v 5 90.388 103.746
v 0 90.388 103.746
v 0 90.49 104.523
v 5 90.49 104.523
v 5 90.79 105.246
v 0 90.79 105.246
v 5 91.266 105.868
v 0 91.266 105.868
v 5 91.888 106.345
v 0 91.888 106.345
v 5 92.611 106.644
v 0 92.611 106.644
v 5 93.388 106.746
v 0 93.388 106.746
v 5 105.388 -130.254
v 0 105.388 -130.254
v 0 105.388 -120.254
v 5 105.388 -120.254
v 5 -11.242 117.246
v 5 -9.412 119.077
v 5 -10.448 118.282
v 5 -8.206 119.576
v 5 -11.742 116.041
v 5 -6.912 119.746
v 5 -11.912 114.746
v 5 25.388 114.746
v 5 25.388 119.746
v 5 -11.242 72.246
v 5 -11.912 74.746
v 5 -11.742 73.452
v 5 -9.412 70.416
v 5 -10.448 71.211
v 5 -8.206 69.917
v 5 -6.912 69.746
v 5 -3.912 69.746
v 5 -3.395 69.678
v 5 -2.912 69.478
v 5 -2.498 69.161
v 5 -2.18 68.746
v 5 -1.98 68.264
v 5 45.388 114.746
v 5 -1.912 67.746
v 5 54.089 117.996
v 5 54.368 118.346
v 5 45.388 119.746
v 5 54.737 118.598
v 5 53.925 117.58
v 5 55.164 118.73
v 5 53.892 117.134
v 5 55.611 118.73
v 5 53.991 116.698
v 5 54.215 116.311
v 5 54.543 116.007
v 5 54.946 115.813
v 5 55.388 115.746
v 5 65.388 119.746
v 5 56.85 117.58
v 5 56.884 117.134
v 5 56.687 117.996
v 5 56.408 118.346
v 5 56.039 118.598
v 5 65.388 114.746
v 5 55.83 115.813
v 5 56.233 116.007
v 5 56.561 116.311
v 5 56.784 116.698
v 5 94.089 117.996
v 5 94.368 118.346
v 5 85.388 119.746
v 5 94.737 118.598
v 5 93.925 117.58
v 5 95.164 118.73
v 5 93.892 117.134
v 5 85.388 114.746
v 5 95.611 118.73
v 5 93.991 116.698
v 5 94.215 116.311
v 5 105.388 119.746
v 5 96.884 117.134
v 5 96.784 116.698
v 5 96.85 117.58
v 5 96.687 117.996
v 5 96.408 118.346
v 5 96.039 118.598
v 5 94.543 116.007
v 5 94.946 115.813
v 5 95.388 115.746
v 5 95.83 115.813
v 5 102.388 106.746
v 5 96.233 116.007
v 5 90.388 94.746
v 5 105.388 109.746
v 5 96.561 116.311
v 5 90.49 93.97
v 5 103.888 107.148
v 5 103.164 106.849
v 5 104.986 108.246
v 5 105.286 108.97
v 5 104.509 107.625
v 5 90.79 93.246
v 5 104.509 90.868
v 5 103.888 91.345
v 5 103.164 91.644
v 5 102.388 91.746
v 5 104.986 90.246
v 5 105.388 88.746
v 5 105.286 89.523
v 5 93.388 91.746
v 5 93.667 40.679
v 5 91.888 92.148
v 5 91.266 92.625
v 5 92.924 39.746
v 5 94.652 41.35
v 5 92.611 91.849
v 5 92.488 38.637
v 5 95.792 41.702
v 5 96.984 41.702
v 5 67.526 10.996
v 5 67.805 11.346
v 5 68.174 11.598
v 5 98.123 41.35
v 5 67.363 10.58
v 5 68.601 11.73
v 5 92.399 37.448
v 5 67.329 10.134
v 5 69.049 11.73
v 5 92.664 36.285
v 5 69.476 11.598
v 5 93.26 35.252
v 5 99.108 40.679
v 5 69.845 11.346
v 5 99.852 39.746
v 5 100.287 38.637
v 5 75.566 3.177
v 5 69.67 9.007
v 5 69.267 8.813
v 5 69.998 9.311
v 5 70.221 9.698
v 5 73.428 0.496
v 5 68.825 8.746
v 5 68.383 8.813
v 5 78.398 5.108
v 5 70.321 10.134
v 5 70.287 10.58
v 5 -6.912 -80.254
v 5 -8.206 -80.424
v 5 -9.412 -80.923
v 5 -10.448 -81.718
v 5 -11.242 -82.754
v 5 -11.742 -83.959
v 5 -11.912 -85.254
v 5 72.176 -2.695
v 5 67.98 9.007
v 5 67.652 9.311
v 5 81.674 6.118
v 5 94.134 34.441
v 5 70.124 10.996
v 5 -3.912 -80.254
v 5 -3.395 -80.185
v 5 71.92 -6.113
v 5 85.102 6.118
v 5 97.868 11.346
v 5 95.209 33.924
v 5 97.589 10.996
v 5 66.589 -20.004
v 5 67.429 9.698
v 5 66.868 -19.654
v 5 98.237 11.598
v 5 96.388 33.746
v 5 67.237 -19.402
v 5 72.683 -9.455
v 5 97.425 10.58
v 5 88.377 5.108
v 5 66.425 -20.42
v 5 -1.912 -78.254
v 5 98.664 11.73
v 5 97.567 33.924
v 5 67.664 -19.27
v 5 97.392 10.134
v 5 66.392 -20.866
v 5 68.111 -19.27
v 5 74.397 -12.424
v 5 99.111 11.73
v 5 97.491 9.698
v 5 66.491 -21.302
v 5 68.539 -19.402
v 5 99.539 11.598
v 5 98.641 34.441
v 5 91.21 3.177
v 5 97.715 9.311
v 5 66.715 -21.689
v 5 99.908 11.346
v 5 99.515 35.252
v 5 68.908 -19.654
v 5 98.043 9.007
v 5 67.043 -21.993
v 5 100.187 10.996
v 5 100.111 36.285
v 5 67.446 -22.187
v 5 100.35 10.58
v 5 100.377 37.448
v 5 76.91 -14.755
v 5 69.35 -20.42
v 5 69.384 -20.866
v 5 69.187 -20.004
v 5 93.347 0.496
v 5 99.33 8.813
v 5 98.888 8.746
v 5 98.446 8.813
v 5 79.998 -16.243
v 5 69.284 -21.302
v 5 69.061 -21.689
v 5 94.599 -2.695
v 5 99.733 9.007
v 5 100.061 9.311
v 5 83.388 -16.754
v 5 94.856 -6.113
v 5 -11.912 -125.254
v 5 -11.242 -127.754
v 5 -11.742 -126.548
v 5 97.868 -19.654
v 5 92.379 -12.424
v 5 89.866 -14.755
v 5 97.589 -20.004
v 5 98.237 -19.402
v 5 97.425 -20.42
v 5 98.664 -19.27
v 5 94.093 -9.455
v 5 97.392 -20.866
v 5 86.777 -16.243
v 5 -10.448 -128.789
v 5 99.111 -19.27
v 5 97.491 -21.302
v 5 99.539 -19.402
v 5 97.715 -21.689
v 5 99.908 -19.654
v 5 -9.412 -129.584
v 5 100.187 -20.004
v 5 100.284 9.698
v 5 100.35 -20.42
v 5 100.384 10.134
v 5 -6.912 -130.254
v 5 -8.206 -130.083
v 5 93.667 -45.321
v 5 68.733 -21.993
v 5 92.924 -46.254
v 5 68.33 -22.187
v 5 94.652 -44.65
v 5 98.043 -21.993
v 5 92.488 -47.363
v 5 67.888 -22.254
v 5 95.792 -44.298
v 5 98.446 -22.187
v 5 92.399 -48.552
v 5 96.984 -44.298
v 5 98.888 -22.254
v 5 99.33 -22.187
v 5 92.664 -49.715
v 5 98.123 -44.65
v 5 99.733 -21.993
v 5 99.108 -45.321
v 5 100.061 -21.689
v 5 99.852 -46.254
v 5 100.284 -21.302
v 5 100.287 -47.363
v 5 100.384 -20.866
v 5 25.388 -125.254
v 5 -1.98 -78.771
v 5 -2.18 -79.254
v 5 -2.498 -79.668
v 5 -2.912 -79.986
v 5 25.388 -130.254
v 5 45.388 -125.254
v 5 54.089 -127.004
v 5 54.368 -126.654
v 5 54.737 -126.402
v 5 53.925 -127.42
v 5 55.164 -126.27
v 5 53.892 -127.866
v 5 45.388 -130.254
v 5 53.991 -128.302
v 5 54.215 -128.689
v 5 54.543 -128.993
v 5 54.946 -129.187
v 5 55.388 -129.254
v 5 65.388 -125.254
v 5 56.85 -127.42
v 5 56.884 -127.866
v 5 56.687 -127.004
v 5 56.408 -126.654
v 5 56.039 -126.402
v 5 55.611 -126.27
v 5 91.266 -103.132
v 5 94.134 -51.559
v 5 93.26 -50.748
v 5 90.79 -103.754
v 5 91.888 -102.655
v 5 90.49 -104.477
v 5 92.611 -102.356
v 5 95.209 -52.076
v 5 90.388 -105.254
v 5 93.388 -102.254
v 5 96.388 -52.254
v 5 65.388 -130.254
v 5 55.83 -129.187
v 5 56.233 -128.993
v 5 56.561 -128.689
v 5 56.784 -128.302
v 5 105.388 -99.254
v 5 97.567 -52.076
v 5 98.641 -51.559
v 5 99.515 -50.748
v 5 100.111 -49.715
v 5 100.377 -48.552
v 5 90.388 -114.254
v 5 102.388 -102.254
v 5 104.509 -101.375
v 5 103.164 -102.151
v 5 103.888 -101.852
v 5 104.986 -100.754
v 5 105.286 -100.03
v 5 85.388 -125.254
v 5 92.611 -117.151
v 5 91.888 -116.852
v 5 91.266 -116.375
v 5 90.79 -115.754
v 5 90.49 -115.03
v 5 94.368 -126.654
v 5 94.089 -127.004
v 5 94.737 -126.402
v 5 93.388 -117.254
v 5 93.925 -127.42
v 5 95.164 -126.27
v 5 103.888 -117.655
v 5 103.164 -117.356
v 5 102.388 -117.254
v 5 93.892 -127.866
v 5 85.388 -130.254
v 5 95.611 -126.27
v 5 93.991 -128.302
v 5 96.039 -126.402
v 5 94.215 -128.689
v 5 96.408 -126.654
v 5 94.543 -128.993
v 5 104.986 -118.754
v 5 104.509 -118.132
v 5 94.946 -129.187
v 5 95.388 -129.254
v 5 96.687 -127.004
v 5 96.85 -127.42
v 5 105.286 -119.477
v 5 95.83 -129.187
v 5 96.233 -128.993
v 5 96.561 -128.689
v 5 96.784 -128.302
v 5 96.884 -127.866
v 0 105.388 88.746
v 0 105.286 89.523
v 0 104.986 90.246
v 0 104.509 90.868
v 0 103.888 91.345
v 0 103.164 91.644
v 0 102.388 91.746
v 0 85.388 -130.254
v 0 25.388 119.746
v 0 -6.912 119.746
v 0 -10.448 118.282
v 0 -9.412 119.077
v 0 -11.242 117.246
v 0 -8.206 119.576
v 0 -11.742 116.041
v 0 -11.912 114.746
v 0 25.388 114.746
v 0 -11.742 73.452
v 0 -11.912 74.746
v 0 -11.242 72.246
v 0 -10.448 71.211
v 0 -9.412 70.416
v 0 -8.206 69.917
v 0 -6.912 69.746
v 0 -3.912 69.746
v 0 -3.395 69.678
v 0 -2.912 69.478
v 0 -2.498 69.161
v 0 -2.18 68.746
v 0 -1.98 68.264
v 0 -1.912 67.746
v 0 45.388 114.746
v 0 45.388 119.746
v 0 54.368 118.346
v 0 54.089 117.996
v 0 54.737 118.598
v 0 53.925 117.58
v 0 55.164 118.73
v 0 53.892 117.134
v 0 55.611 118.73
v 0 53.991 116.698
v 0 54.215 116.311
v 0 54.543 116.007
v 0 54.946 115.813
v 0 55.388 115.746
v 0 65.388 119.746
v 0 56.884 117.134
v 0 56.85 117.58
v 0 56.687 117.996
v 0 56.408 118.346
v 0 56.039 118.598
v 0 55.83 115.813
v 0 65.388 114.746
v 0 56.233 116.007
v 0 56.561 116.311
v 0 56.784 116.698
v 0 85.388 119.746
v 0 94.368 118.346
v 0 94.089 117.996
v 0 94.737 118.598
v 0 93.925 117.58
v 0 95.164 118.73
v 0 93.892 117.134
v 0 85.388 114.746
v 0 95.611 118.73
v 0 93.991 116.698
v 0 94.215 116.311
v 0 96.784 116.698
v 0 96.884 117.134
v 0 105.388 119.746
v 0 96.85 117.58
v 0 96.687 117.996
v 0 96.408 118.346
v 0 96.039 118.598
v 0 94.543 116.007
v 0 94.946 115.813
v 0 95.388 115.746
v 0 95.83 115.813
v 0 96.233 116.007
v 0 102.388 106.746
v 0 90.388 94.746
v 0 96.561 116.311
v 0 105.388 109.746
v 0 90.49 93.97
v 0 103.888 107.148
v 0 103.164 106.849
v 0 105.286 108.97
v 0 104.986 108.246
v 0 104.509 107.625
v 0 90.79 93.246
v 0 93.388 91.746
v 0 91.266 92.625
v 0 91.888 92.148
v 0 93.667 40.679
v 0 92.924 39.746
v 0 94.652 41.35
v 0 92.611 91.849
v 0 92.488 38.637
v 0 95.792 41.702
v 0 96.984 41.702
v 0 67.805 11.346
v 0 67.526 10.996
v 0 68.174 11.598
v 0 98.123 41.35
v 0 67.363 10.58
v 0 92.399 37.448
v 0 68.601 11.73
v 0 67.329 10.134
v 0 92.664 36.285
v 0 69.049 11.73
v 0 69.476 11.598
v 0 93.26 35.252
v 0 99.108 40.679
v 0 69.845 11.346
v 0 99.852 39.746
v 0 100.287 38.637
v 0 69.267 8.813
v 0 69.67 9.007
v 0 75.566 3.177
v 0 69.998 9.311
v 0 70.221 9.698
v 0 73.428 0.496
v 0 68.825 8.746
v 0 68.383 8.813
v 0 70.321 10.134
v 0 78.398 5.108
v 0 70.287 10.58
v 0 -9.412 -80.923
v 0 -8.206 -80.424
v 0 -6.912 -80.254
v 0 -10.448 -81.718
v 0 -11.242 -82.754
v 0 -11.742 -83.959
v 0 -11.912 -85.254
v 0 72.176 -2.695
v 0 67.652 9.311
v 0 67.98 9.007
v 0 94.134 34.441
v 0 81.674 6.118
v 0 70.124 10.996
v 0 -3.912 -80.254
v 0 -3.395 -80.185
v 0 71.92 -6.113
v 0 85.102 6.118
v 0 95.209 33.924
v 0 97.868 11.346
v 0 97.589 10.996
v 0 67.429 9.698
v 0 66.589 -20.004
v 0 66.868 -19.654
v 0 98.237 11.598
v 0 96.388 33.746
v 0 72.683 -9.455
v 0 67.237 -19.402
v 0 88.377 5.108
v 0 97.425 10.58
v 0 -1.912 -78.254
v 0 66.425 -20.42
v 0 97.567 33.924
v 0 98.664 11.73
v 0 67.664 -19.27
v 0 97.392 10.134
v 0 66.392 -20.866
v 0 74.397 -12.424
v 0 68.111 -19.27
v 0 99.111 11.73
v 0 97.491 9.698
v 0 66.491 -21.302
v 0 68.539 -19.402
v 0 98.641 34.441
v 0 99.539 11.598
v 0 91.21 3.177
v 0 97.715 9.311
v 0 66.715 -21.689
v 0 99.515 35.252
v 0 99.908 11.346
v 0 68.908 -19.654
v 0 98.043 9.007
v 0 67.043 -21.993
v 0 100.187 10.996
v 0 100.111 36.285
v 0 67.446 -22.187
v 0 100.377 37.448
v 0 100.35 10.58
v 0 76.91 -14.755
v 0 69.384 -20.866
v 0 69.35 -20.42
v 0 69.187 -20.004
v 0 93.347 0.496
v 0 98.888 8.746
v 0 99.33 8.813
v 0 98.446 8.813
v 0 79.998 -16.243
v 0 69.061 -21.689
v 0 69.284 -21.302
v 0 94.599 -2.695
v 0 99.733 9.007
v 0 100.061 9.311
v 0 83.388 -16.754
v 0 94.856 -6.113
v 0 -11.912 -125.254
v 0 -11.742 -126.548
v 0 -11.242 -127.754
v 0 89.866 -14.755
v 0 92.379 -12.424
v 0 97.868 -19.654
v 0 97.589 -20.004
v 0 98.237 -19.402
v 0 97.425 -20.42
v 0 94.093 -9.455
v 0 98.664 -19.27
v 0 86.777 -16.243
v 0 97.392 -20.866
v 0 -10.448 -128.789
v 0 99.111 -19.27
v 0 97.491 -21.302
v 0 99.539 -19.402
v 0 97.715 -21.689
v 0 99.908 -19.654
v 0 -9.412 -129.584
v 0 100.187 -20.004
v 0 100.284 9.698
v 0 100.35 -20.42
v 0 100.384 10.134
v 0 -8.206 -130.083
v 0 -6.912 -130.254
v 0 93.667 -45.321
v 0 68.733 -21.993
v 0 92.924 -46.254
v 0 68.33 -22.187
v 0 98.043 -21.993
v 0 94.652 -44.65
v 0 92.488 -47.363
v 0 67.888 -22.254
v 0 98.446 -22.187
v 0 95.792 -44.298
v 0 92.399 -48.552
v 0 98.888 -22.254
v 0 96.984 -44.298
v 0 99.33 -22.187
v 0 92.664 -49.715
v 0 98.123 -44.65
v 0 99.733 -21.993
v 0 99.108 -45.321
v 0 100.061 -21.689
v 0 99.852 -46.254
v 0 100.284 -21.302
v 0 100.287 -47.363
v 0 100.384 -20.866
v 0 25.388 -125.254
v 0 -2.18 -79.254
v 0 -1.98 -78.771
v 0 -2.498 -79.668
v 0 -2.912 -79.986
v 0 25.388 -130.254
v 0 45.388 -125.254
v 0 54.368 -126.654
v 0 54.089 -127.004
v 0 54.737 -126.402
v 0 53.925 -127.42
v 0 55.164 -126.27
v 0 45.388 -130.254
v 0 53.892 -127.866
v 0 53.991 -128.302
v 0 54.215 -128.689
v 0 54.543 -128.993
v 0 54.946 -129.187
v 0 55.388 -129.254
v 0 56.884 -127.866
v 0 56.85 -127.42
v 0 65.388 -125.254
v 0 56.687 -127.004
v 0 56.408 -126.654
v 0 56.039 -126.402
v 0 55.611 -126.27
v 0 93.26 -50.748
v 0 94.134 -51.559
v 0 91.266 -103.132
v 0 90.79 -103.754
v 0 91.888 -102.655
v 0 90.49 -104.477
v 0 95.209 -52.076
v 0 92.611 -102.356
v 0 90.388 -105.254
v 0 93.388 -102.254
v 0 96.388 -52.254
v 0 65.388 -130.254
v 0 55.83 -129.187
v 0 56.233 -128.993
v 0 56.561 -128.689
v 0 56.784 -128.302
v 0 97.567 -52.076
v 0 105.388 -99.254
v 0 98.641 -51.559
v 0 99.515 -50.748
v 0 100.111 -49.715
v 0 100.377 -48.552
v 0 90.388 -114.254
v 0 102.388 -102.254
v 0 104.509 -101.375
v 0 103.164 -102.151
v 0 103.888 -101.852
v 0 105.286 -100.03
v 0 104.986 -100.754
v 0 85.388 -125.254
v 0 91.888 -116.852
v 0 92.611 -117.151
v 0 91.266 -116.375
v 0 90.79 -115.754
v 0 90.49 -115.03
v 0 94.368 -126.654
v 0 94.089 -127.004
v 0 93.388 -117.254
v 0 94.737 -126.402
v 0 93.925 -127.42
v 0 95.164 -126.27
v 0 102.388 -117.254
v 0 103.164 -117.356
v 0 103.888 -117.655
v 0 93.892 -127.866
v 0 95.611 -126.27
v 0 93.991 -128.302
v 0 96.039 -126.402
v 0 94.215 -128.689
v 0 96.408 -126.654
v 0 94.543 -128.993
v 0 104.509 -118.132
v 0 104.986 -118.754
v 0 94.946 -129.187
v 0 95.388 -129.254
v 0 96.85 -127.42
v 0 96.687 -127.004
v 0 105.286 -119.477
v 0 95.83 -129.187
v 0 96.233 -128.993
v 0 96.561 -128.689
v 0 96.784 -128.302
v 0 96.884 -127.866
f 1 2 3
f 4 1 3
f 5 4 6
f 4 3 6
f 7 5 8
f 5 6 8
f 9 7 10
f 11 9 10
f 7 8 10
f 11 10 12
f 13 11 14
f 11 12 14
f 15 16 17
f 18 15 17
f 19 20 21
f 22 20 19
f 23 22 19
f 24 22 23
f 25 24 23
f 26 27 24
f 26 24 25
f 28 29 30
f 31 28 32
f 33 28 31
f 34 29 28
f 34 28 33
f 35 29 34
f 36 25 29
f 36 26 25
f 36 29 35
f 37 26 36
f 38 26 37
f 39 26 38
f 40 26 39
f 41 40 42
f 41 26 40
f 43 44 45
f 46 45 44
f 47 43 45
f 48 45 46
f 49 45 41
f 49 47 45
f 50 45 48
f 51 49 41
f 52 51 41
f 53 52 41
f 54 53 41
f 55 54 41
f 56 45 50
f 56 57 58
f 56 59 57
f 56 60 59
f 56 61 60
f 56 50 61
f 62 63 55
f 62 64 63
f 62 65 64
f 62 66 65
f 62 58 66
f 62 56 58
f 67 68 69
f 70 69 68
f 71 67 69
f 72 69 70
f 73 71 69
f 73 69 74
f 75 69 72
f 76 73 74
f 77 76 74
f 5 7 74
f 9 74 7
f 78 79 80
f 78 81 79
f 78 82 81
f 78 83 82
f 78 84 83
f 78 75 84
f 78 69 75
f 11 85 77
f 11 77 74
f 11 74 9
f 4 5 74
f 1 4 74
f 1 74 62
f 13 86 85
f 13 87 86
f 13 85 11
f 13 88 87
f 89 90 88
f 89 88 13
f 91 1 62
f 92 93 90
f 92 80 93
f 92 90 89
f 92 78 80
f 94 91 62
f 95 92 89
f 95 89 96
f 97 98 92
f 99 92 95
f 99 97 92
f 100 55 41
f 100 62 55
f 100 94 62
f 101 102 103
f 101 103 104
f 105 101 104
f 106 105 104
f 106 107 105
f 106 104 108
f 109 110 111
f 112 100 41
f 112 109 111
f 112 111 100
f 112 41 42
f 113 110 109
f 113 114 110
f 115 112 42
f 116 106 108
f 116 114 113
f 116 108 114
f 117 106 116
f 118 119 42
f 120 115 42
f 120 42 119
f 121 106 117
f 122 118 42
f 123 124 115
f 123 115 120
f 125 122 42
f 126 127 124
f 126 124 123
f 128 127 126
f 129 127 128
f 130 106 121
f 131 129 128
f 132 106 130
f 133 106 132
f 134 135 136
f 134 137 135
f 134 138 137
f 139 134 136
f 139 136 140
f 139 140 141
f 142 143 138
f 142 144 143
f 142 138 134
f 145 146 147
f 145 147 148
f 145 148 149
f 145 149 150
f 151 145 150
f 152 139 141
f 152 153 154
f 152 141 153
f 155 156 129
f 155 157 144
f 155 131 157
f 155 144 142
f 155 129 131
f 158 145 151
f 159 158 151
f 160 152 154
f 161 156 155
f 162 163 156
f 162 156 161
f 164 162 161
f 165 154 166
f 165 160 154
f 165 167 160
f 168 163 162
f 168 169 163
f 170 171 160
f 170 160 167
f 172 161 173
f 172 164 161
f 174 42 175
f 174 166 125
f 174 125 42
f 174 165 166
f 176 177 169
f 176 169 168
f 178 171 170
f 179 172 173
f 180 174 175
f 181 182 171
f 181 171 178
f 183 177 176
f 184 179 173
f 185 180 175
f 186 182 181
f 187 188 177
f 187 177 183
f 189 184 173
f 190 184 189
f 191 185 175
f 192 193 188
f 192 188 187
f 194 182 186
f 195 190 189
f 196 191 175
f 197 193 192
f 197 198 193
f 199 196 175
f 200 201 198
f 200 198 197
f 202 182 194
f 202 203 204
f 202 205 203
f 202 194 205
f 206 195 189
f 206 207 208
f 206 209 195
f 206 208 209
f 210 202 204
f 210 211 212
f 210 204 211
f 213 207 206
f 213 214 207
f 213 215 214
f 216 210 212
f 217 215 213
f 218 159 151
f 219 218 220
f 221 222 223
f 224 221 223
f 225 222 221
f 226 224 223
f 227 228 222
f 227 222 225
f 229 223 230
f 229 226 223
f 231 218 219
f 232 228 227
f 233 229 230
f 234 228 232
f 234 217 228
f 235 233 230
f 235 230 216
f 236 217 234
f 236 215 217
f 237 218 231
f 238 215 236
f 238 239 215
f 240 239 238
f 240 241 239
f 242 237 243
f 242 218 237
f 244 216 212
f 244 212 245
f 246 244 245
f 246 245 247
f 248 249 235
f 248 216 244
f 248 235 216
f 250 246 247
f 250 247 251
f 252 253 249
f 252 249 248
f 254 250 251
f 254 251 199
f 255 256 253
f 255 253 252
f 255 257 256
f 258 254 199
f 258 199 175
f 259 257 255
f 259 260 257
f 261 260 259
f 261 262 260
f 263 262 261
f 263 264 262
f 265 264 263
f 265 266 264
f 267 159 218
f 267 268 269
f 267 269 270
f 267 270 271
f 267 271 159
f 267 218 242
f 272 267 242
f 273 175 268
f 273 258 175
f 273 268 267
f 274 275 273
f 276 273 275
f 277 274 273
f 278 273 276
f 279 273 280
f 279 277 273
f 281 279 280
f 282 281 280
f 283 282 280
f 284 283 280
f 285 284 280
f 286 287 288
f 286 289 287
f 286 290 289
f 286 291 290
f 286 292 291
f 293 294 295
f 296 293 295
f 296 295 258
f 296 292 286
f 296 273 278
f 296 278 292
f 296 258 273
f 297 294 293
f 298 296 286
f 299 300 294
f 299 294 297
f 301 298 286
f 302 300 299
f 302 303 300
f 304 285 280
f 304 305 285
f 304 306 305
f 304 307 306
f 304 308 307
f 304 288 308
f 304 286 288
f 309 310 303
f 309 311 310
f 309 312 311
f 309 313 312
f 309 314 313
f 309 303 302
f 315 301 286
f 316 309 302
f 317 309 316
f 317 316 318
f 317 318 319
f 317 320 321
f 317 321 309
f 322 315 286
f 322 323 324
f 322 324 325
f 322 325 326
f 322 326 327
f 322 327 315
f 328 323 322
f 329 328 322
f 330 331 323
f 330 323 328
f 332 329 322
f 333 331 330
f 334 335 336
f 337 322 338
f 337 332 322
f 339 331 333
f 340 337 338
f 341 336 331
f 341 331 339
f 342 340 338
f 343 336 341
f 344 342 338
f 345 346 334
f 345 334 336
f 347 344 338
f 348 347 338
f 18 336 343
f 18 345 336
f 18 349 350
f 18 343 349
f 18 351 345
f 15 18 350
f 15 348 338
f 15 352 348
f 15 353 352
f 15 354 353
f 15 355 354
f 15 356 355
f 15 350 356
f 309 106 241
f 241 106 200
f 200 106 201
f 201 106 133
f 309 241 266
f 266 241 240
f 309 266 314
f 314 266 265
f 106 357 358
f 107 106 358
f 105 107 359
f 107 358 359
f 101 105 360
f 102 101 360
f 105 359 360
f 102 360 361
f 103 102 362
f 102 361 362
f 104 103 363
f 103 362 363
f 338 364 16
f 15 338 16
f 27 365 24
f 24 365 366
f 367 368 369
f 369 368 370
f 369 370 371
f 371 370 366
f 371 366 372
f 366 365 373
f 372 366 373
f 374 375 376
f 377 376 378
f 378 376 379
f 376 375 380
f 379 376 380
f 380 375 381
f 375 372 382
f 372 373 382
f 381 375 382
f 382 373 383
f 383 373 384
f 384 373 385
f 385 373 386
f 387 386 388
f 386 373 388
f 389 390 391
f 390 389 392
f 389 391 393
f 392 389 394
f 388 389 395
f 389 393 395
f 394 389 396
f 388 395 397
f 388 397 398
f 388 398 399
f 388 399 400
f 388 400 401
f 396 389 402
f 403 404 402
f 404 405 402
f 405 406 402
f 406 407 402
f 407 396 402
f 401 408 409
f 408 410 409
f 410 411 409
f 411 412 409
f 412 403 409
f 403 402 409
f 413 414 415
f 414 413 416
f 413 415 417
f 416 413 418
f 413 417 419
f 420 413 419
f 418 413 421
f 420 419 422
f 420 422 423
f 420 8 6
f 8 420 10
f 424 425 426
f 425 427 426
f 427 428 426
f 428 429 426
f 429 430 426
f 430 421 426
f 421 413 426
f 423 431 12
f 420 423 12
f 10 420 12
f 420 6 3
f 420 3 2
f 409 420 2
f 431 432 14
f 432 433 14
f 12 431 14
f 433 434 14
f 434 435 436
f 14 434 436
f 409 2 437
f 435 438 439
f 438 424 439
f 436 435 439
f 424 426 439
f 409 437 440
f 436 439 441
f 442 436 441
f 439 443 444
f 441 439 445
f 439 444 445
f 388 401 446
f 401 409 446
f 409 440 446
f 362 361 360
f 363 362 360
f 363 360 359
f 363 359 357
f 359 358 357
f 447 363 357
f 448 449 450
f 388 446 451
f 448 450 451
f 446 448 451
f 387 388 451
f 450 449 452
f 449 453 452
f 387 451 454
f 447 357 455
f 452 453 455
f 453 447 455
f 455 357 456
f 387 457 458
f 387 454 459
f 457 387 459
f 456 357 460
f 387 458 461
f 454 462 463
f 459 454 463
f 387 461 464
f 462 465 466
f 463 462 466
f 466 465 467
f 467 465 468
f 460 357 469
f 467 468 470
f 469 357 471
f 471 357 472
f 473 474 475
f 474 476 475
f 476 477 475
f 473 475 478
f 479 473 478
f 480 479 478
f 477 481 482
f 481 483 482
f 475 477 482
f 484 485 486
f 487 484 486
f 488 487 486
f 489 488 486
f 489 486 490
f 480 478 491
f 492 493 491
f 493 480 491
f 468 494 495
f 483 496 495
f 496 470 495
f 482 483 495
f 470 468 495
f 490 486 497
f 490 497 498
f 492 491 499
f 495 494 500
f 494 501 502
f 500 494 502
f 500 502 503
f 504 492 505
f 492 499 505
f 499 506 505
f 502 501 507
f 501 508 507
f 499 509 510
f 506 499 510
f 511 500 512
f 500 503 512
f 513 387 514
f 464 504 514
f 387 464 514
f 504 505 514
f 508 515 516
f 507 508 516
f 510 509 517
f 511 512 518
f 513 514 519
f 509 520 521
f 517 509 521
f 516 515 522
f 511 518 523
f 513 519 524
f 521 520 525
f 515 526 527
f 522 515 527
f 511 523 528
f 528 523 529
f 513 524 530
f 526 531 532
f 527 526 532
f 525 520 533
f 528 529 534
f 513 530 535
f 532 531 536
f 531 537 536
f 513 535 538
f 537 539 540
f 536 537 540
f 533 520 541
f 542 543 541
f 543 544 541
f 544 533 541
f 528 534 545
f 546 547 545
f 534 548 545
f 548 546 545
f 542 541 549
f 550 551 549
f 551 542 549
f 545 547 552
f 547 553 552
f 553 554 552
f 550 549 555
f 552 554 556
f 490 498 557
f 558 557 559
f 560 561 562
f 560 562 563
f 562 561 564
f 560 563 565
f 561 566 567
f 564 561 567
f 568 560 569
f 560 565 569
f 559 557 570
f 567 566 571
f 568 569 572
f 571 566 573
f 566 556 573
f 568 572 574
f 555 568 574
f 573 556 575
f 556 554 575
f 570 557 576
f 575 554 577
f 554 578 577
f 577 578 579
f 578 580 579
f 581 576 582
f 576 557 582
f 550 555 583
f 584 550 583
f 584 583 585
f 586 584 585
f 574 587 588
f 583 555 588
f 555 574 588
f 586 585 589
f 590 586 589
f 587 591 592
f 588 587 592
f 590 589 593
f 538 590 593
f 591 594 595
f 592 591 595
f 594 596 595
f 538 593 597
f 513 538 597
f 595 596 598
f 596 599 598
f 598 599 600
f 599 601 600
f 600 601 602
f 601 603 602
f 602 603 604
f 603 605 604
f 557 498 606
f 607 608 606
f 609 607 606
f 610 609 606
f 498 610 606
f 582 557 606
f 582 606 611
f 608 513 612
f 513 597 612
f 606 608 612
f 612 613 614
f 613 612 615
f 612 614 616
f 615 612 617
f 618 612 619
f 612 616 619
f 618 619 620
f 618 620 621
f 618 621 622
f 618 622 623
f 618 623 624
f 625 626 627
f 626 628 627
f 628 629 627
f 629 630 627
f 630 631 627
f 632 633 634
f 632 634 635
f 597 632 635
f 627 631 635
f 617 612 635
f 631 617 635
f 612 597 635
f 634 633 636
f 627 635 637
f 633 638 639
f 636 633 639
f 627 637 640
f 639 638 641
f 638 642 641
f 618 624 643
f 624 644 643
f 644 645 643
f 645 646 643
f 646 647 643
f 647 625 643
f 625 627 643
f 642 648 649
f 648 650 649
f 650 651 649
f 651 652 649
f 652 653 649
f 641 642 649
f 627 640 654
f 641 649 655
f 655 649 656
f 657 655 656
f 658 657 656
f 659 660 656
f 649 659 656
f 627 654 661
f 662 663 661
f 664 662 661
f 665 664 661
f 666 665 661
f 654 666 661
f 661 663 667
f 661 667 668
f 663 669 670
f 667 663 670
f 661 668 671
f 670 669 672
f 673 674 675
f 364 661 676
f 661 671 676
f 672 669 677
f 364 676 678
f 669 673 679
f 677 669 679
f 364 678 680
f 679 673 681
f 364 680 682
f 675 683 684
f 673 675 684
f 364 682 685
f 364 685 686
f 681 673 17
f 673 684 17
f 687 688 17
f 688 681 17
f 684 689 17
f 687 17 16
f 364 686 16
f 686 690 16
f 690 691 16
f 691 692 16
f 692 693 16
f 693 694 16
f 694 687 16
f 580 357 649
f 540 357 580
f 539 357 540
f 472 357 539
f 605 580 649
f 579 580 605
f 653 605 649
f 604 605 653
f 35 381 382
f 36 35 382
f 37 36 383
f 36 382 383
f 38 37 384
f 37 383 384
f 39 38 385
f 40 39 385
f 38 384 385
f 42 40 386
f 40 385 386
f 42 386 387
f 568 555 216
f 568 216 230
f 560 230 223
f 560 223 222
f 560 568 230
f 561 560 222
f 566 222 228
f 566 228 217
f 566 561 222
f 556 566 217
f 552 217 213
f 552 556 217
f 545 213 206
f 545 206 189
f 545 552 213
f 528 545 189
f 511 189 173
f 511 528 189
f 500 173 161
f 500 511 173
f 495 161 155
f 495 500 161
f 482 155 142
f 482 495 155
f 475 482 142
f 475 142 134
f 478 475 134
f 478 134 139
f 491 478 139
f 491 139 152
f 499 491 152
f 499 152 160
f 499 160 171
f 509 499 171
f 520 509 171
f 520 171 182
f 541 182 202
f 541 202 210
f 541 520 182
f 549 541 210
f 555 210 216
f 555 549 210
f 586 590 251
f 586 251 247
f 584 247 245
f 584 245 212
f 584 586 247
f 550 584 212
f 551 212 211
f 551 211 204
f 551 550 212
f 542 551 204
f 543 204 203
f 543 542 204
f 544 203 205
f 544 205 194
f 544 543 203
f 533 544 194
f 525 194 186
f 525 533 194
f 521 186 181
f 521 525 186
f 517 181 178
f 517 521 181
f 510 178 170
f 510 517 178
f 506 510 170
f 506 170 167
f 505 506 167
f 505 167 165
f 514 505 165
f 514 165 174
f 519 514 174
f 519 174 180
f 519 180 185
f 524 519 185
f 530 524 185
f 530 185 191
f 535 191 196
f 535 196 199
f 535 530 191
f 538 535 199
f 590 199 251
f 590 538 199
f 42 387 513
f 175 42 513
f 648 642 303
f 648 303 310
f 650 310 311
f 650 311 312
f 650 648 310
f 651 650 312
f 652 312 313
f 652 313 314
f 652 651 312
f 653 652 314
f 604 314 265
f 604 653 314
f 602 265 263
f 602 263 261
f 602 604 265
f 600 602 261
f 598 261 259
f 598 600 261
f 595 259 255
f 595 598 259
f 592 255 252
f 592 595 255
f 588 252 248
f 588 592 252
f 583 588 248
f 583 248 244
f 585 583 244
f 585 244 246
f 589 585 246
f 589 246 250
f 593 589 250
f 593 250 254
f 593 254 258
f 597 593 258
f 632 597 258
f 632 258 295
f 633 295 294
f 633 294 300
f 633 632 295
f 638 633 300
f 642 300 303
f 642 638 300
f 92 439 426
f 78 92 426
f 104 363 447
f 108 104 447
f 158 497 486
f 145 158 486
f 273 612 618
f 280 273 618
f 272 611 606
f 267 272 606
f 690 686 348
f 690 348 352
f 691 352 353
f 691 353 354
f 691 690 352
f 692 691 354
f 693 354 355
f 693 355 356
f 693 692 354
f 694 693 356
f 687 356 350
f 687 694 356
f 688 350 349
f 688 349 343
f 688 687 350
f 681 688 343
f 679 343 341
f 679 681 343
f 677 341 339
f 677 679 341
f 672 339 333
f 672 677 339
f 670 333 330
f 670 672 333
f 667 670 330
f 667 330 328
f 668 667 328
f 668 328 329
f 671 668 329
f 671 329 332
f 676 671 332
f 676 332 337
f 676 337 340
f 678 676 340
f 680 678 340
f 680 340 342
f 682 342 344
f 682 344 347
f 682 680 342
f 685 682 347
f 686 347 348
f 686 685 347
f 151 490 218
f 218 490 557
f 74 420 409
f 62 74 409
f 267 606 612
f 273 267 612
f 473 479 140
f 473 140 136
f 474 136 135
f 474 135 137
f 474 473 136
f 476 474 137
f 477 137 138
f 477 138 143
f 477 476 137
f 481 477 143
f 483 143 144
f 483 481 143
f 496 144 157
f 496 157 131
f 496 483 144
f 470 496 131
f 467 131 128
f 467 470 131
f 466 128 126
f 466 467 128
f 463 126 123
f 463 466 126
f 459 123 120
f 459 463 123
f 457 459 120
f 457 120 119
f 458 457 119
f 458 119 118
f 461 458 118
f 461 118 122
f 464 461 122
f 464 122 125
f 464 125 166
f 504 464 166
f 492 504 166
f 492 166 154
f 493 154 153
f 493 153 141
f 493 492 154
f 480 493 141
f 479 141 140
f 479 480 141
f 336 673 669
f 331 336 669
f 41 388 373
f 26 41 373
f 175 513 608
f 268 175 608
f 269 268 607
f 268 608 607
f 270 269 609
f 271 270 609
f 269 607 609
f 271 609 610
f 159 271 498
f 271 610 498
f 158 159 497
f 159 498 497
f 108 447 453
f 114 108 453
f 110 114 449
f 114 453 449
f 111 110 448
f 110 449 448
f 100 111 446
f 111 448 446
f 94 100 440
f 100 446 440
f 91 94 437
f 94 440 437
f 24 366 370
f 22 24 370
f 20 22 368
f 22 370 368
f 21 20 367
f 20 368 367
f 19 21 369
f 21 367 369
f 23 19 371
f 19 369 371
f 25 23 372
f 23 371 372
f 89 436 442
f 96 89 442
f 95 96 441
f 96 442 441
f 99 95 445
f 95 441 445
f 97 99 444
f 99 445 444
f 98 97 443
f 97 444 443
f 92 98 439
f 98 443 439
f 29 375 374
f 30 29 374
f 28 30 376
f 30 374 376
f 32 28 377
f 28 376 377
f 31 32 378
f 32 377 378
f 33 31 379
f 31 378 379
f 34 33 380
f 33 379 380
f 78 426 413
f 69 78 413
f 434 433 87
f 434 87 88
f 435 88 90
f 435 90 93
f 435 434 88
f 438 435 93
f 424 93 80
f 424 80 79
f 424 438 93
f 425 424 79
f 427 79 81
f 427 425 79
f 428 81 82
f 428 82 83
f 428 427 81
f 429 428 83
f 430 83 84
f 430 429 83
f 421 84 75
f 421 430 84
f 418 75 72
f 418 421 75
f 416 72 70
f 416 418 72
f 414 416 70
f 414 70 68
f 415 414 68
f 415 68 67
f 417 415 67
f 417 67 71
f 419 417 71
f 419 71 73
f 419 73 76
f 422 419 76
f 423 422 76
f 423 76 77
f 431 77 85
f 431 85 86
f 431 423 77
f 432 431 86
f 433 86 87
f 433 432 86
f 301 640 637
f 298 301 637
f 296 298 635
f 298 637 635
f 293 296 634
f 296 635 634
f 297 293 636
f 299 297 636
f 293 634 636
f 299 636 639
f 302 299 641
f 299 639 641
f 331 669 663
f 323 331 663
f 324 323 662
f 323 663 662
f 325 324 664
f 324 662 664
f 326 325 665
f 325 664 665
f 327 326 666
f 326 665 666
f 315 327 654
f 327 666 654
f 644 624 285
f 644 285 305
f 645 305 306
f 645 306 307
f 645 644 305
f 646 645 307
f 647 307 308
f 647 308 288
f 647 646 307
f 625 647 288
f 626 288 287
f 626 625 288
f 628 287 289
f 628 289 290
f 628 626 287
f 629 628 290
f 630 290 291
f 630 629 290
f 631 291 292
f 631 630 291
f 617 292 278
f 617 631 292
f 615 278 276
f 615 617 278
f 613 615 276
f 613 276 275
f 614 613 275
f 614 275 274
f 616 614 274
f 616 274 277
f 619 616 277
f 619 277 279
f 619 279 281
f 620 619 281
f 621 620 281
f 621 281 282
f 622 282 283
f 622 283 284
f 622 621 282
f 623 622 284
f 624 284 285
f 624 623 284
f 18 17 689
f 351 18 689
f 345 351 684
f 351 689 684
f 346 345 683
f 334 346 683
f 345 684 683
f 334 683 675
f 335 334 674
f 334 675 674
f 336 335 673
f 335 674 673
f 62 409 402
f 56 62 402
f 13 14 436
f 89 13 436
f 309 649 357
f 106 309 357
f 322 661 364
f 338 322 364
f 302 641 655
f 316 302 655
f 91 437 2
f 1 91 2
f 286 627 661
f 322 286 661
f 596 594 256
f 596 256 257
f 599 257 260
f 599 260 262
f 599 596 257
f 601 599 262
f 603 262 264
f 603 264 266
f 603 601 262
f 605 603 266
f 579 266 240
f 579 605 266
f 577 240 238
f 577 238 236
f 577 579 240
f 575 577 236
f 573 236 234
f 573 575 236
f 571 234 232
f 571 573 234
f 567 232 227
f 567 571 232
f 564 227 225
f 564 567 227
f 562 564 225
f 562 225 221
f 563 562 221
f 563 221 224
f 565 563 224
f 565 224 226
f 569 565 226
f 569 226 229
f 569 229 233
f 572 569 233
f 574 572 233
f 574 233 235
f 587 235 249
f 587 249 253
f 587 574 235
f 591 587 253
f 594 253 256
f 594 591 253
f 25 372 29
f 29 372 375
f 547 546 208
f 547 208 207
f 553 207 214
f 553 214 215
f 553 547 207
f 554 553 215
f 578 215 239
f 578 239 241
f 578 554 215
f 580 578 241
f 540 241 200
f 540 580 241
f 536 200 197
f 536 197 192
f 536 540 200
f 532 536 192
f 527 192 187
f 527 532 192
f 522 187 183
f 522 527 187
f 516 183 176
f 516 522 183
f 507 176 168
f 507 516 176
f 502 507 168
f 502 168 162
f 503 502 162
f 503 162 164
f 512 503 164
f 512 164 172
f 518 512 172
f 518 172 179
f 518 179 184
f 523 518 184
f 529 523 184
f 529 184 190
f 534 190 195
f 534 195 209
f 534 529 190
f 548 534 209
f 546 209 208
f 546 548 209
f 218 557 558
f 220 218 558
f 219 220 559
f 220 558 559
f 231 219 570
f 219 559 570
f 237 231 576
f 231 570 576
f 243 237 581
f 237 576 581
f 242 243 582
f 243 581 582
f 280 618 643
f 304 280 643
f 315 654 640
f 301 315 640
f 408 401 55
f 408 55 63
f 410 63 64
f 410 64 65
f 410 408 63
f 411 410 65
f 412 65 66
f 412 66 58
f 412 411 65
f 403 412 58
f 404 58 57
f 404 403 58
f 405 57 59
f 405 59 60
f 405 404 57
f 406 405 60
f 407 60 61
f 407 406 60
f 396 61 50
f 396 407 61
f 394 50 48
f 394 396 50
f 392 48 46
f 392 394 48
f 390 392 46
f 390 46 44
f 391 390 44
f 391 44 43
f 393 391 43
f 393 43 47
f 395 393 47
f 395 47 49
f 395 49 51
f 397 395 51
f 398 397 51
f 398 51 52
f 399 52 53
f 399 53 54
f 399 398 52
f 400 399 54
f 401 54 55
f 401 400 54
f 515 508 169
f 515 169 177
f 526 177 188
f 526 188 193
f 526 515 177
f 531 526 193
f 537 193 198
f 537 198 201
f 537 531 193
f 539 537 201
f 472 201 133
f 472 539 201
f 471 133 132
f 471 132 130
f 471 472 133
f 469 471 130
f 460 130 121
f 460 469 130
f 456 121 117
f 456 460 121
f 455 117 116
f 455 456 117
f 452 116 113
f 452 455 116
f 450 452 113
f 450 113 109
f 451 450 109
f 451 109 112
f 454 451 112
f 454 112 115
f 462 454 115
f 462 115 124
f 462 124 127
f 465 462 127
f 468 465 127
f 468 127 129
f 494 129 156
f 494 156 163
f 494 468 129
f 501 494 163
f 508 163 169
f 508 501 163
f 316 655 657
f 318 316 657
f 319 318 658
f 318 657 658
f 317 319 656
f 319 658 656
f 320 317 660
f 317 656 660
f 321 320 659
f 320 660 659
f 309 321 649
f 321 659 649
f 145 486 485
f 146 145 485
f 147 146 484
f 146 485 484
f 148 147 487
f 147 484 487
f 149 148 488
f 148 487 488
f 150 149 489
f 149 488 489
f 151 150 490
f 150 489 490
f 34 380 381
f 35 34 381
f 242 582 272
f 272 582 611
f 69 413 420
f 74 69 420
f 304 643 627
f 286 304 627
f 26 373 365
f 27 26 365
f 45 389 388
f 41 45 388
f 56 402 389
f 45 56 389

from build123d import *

# Parameters (mm, degrees)
SKETCH_1_R      = 4
SKETCH_1_R_2    = 11.5
SKETCH_1_R_3    = 1.5
EXTRUDE_1_DEPTH = 5


with BuildPart() as part:
    # 草图1 → 凸台-拉伸1 (new body)
    with BuildSketch(Plane(origin=(0, 0, 0), x_dir=(0, 0, -1), z_dir=(1, 0, 0))):
        with BuildLine():
            Line((-69.746431282, -6.912239682), (-69.746431282, -3.912239682))
            ThreePointArc((-69.746431282, -3.912239682), (-69.160644844, -2.49802612), (-67.746431282, -1.912239682))
            Line((-67.746431282, -1.912239682), (78.253568718, -1.912239682))
            ThreePointArc((78.253568718, -1.912239682), (79.667782281, -2.49802612), (80.253568718, -3.912239682))
            Line((80.253568718, -3.912239682), (80.253568718, -6.912239682))
            ThreePointArc((80.253568718, -6.912239682), (81.718034813, -10.447773588), (85.253568718, -11.912239682))
            Line((85.253568718, -11.912239682), (125.253568718, -11.912239682))
            ThreePointArc((125.253568718, -11.912239682), (128.789102624, -10.447773588), (130.253568718, -6.912239682))
            Line((130.253568718, -6.912239682), (130.253568718, 25.387760318))
            Line((130.253568718, 25.387760318), (125.253568718, 25.387760318))
            Line((125.253568718, 25.387760318), (125.253568718, 45.387760318))
            Line((125.253568718, 45.387760318), (130.253568718, 45.387760318))
            Line((130.253568718, 45.387760318), (130.253568718, 65.387760318))
            Line((130.253568718, 65.387760318), (125.253568718, 65.387760318))
            Line((125.253568718, 65.387760318), (125.253568718, 85.387760318))
            Line((125.253568718, 85.387760318), (130.253568718, 85.387760318))
            Line((130.253568718, 85.387760318), (130.253568718, 105.387760318))
            Line((130.253568718, 105.387760318), (120.253568718, 105.387760318))
            ThreePointArc((120.253568718, 105.387760318), (118.132248375, 104.509080662), (117.253568718, 102.387760318))
            Line((117.253568718, 102.387760318), (117.253568718, 93.387760318))
            ThreePointArc((117.253568718, 93.387760318), (116.374889062, 91.266439974), (114.253568718, 90.387760318))
            Line((114.253568718, 90.387760318), (105.253568718, 90.387760318))
            ThreePointArc((105.253568718, 90.387760318), (103.132248375, 91.266439974), (102.253568718, 93.387760318))
            Line((102.253568718, 93.387760318), (102.253568718, 102.387760318))
            ThreePointArc((102.253568718, 102.387760318), (101.374889062, 104.509080662), (99.253568718, 105.387760318))
            Line((99.253568718, 105.387760318), (-88.746431282, 105.387760318))
            ThreePointArc((-88.746431282, 105.387760318), (-90.867751625, 104.509080662), (-91.746431282, 102.387760318))
            Line((-91.746431282, 102.387760318), (-91.746431282, 93.387760318))
            ThreePointArc((-91.746431282, 93.387760318), (-92.625110938, 91.266439974), (-94.746431282, 90.387760318))
            Line((-94.746431282, 90.387760318), (-103.746431282, 90.387760318))
            ThreePointArc((-103.746431282, 90.387760318), (-105.867751625, 91.266439974), (-106.746431282, 93.387760318))
            Line((-106.746431282, 93.387760318), (-106.746431282, 102.387760318))
            ThreePointArc((-106.746431282, 102.387760318), (-107.625110938, 104.509080662), (-109.746431282, 105.387760318))
            Line((-109.746431282, 105.387760318), (-119.746431282, 105.387760318))
            Line((-119.746431282, 105.387760318), (-119.746431282, 85.387760318))
            Line((-119.746431282, 85.387760318), (-114.746431282, 85.387760318))
            Line((-114.746431282, 85.387760318), (-114.746431282, 65.387760318))
            Line((-114.746431282, 65.387760318), (-119.746431282, 65.387760318))
            Line((-119.746431282, 65.387760318), (-119.746431282, 45.387760318))
            Line((-119.746431282, 45.387760318), (-114.746431282, 45.387760318))
            Line((-114.746431282, 45.387760318), (-114.746431282, 25.387760318))
            Line((-114.746431282, 25.387760318), (-119.746431282, 25.387760318))
            Line((-119.746431282, 25.387760318), (-119.746431282, -6.912239682))
            ThreePointArc((-119.746431282, -6.912239682), (-118.281965187, -10.447773588), (-114.746431282, -11.912239682))
            Line((-114.746431282, -11.912239682), (-74.746431282, -11.912239682))
            ThreePointArc((-74.746431282, -11.912239682), (-71.210897376, -10.447773588), (-69.746431282, -6.912239682))
        make_face()
        with Locations((48.253568718, 96.387760318)):
            Circle(SKETCH_1_R, mode=Mode.SUBTRACT)
        with Locations((-37.746431282, 96.387760318)):
            Circle(SKETCH_1_R, mode=Mode.SUBTRACT)
        with Locations((5.253568718, 83.387760318)):
            Circle(SKETCH_1_R_2, mode=Mode.SUBTRACT)
        with Locations((-10.246431282, 98.887760318)):
            Circle(SKETCH_1_R_3, mode=Mode.SUBTRACT)
        with Locations((20.753568718, 98.887760318)):
            Circle(SKETCH_1_R_3, mode=Mode.SUBTRACT)
        with Locations((20.753568718, 67.887760318)):
            Circle(SKETCH_1_R_3, mode=Mode.SUBTRACT)
        with Locations((-10.246431282, 68.825049391)):
            Circle(SKETCH_1_R_3, mode=Mode.SUBTRACT)
        with Locations((127.753568718, 95.387760318)):
            Circle(SKETCH_1_R_3, mode=Mode.SUBTRACT)
        with Locations((127.753568718, 55.387760318)):
            Circle(SKETCH_1_R_3, mode=Mode.SUBTRACT)
        with Locations((-117.246431282, 95.387760318)):
            Circle(SKETCH_1_R_3, mode=Mode.SUBTRACT)
        with Locations((-117.246431282, 55.387760318)):
            Circle(SKETCH_1_R_3, mode=Mode.SUBTRACT)
    extrude(amount=EXTRUDE_1_DEPTH)


solid = part.part
